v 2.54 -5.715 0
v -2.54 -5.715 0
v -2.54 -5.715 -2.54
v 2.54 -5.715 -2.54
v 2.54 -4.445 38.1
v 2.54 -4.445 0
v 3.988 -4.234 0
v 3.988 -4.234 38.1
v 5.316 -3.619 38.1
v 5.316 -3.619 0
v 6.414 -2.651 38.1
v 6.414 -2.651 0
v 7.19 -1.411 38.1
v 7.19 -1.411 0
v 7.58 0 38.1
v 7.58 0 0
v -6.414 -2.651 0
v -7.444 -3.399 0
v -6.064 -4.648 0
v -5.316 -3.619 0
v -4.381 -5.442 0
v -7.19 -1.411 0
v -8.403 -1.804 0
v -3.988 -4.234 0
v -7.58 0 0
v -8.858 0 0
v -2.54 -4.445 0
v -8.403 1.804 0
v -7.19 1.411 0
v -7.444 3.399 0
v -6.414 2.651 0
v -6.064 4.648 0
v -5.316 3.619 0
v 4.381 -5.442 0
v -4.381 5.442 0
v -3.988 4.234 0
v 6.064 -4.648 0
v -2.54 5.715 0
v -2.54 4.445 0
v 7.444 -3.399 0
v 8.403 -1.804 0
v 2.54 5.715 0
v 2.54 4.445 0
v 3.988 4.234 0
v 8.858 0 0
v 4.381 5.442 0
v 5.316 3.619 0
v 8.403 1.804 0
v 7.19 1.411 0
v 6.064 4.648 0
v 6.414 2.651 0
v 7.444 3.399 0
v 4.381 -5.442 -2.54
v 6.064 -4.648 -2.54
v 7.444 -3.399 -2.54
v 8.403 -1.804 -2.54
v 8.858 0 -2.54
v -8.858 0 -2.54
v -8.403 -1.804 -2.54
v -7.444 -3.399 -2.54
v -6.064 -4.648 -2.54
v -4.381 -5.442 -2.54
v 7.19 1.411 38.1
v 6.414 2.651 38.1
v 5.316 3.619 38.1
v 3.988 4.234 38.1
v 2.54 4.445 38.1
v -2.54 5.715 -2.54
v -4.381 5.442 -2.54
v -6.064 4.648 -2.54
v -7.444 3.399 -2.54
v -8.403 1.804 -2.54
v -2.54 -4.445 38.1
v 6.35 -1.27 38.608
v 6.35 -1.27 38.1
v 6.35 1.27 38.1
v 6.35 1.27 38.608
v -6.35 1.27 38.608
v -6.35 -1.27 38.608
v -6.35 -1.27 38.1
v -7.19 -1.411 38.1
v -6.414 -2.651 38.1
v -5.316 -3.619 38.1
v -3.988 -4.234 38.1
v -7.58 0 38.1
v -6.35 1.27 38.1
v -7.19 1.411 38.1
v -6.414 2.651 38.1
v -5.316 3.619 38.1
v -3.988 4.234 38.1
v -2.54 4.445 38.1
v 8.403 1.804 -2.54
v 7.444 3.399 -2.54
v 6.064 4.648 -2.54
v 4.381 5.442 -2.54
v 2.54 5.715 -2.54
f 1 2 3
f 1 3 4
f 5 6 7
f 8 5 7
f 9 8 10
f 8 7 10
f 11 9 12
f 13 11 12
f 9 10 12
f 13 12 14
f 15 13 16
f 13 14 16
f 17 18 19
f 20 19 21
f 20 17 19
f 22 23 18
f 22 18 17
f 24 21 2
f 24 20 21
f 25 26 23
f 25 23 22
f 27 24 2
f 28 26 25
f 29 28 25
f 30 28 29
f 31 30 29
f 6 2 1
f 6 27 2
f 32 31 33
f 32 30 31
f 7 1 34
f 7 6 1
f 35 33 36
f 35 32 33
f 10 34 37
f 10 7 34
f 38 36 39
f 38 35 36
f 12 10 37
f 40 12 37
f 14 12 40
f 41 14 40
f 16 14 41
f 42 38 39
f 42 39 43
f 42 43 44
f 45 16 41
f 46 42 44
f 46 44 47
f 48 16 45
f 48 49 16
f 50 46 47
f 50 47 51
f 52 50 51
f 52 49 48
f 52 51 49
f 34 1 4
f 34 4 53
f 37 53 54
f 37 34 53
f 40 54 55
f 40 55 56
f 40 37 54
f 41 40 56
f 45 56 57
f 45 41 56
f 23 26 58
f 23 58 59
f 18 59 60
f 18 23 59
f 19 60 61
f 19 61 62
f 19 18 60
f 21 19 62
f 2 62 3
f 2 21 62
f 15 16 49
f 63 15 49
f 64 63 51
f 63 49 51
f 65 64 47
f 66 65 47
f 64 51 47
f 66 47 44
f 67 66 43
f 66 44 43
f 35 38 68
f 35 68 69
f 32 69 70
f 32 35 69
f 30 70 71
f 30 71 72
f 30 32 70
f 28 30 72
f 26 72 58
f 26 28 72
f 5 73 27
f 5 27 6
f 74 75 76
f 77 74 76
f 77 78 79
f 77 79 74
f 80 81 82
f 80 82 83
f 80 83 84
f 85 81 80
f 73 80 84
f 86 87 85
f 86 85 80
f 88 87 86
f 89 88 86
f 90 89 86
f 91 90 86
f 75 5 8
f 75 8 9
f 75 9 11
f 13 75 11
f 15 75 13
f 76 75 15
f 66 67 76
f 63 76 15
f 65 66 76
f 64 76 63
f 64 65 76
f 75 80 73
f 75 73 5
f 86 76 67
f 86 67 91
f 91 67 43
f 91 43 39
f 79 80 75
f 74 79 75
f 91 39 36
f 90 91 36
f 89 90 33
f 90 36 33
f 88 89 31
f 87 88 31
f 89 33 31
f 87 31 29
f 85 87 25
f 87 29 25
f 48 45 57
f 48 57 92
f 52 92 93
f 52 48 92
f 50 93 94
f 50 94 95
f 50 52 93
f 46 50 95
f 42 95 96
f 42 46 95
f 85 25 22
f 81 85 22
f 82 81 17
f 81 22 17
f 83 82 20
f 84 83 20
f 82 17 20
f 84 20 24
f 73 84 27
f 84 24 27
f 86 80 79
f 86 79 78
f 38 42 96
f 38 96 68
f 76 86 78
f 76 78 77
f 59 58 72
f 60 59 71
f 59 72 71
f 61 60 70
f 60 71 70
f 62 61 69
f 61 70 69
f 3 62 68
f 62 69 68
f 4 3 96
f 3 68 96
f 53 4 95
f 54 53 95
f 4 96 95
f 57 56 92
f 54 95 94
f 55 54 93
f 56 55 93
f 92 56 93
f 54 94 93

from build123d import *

# Parameters (mm, degrees)
F0_W     = 12.7
F0_H     = 2.54
F1_DEPTH = 38.608
F2_DEPTH = 38.1
F3_DEPTH = 2.54


with BuildPart() as f1:
    # F0 (on Top) → F1 (new body)
    with BuildSketch(Plane.XY):
        Rectangle(F0_W, F0_H)
    extrude(amount=F1_DEPTH)



with BuildPart() as f2:
    # F0 (on Top) → F2 (new body)
    with BuildSketch(Plane.XY):
        with BuildLine():
            Line((-2.54, -4.445), (2.54, -4.445))
            ThreePointArc((2.54, -4.445), (5.900104, -3.175), (7.580156, 0))
            ThreePointArc((7.580156, 0), (5.900104, 3.175), (2.54, 4.445))
            Line((2.54, 4.445), (-2.54, 4.445))
            ThreePointArc((-2.54, 4.445), (-5.900104, 3.175), (-7.580156, 0))
            ThreePointArc((-7.580156, 0), (-5.900104, -3.175), (-2.54, -4.445))
        make_face()
        Rectangle(F0_W, F0_H, mode=Mode.SUBTRACT)
        Rectangle(F0_W, F0_H)
    extrude(amount=F2_DEPTH)


with BuildPart() as f1_1:
    add(f1.part)

    add(f2.part)  # F3 merges F2
    # F0 (on Top) → F3 (join)
    with BuildSketch(Plane.XY):
        with BuildLine():
            Line((-2.54, -5.715), (2.54, -5.715))
            ThreePointArc((2.54, -5.715), (6.799709, -4.074286), (8.85817, 0))
            ThreePointArc((8.85817, 0), (6.799709, 4.074286), (2.54, 5.715))
            Line((2.54, 5.715), (-2.54, 5.715))
            ThreePointArc((-2.54, 5.715), (-6.799709, 4.074286), (-8.85817, 0))
            ThreePointArc((-8.85817, 0), (-6.799709, -4.074286), (-2.54, -5.715))
        make_face()
        with BuildLine():
            ThreePointArc((-7.62, 0.635), (-7.610029, 0.316876), (-7.580156, 0))
            ThreePointArc((-7.580156, 0), (-7.610029, -0.316876), (-7.62, -0.635))
            Line((-7.62, -0.635), (-7.62, 0.635))
        make_face(mode=Mode.SUBTRACT)
        with BuildLine():
            ThreePointArc((7.580156, 0), (5.900104, -3.175), (2.54, -4.445))
            Line((2.54, -4.445), (-2.54, -4.445))
            ThreePointArc((-2.54, -4.445), (-5.900104, -3.175), (-7.580156, 0))
            ThreePointArc((-7.580156, 0), (-5.900104, 3.175), (-2.54, 4.445))
            Line((-2.54, 4.445), (2.54, 4.445))
            ThreePointArc((2.54, 4.445), (5.900104, 3.175), (7.580156, 0))
        make_face(mode=Mode.SUBTRACT)
        with BuildLine():
            ThreePointArc((7.62, -0.635), (7.610029, -0.316876), (7.580156, 0))
            ThreePointArc((7.580156, 0), (7.610029, 0.316876), (7.62, 0.635))
            Line((7.62, 0.635), (7.62, -0.635))
        make_face(mode=Mode.SUBTRACT)
        with BuildLine():
            Line((-2.54, -4.445), (2.54, -4.445))
            ThreePointArc((2.54, -4.445), (5.900104, -3.175), (7.580156, 0))
            ThreePointArc((7.580156, 0), (5.900104, 3.175), (2.54, 4.445))
            Line((2.54, 4.445), (-2.54, 4.445))
            ThreePointArc((-2.54, 4.445), (-5.900104, 3.175), (-7.580156, 0))
            ThreePointArc((-7.580156, 0), (-5.900104, -3.175), (-2.54, -4.445))
        make_face()
        Rectangle(F0_W, F0_H, mode=Mode.SUBTRACT)
        Rectangle(F0_W, F0_H)
        with BuildLine():
            ThreePointArc((7.62, 0.635), (7.610029, 0.316876), (7.580156, 0))
            ThreePointArc((7.580156, 0), (7.610029, -0.316876), (7.62, -0.635))
            Line((7.62, -0.635), (7.62, 0.635))
        make_face()
        with BuildLine():
            ThreePointArc((-7.62, -0.635), (-7.610029, -0.316876), (-7.580156, 0))
            ThreePointArc((-7.580156, 0), (-7.610029, 0.316876), (-7.62, 0.635))
            Line((-7.62, 0.635), (-7.62, -0.635))
        make_face()
    extrude(amount=-F3_DEPTH)


solid = f1_1.part
